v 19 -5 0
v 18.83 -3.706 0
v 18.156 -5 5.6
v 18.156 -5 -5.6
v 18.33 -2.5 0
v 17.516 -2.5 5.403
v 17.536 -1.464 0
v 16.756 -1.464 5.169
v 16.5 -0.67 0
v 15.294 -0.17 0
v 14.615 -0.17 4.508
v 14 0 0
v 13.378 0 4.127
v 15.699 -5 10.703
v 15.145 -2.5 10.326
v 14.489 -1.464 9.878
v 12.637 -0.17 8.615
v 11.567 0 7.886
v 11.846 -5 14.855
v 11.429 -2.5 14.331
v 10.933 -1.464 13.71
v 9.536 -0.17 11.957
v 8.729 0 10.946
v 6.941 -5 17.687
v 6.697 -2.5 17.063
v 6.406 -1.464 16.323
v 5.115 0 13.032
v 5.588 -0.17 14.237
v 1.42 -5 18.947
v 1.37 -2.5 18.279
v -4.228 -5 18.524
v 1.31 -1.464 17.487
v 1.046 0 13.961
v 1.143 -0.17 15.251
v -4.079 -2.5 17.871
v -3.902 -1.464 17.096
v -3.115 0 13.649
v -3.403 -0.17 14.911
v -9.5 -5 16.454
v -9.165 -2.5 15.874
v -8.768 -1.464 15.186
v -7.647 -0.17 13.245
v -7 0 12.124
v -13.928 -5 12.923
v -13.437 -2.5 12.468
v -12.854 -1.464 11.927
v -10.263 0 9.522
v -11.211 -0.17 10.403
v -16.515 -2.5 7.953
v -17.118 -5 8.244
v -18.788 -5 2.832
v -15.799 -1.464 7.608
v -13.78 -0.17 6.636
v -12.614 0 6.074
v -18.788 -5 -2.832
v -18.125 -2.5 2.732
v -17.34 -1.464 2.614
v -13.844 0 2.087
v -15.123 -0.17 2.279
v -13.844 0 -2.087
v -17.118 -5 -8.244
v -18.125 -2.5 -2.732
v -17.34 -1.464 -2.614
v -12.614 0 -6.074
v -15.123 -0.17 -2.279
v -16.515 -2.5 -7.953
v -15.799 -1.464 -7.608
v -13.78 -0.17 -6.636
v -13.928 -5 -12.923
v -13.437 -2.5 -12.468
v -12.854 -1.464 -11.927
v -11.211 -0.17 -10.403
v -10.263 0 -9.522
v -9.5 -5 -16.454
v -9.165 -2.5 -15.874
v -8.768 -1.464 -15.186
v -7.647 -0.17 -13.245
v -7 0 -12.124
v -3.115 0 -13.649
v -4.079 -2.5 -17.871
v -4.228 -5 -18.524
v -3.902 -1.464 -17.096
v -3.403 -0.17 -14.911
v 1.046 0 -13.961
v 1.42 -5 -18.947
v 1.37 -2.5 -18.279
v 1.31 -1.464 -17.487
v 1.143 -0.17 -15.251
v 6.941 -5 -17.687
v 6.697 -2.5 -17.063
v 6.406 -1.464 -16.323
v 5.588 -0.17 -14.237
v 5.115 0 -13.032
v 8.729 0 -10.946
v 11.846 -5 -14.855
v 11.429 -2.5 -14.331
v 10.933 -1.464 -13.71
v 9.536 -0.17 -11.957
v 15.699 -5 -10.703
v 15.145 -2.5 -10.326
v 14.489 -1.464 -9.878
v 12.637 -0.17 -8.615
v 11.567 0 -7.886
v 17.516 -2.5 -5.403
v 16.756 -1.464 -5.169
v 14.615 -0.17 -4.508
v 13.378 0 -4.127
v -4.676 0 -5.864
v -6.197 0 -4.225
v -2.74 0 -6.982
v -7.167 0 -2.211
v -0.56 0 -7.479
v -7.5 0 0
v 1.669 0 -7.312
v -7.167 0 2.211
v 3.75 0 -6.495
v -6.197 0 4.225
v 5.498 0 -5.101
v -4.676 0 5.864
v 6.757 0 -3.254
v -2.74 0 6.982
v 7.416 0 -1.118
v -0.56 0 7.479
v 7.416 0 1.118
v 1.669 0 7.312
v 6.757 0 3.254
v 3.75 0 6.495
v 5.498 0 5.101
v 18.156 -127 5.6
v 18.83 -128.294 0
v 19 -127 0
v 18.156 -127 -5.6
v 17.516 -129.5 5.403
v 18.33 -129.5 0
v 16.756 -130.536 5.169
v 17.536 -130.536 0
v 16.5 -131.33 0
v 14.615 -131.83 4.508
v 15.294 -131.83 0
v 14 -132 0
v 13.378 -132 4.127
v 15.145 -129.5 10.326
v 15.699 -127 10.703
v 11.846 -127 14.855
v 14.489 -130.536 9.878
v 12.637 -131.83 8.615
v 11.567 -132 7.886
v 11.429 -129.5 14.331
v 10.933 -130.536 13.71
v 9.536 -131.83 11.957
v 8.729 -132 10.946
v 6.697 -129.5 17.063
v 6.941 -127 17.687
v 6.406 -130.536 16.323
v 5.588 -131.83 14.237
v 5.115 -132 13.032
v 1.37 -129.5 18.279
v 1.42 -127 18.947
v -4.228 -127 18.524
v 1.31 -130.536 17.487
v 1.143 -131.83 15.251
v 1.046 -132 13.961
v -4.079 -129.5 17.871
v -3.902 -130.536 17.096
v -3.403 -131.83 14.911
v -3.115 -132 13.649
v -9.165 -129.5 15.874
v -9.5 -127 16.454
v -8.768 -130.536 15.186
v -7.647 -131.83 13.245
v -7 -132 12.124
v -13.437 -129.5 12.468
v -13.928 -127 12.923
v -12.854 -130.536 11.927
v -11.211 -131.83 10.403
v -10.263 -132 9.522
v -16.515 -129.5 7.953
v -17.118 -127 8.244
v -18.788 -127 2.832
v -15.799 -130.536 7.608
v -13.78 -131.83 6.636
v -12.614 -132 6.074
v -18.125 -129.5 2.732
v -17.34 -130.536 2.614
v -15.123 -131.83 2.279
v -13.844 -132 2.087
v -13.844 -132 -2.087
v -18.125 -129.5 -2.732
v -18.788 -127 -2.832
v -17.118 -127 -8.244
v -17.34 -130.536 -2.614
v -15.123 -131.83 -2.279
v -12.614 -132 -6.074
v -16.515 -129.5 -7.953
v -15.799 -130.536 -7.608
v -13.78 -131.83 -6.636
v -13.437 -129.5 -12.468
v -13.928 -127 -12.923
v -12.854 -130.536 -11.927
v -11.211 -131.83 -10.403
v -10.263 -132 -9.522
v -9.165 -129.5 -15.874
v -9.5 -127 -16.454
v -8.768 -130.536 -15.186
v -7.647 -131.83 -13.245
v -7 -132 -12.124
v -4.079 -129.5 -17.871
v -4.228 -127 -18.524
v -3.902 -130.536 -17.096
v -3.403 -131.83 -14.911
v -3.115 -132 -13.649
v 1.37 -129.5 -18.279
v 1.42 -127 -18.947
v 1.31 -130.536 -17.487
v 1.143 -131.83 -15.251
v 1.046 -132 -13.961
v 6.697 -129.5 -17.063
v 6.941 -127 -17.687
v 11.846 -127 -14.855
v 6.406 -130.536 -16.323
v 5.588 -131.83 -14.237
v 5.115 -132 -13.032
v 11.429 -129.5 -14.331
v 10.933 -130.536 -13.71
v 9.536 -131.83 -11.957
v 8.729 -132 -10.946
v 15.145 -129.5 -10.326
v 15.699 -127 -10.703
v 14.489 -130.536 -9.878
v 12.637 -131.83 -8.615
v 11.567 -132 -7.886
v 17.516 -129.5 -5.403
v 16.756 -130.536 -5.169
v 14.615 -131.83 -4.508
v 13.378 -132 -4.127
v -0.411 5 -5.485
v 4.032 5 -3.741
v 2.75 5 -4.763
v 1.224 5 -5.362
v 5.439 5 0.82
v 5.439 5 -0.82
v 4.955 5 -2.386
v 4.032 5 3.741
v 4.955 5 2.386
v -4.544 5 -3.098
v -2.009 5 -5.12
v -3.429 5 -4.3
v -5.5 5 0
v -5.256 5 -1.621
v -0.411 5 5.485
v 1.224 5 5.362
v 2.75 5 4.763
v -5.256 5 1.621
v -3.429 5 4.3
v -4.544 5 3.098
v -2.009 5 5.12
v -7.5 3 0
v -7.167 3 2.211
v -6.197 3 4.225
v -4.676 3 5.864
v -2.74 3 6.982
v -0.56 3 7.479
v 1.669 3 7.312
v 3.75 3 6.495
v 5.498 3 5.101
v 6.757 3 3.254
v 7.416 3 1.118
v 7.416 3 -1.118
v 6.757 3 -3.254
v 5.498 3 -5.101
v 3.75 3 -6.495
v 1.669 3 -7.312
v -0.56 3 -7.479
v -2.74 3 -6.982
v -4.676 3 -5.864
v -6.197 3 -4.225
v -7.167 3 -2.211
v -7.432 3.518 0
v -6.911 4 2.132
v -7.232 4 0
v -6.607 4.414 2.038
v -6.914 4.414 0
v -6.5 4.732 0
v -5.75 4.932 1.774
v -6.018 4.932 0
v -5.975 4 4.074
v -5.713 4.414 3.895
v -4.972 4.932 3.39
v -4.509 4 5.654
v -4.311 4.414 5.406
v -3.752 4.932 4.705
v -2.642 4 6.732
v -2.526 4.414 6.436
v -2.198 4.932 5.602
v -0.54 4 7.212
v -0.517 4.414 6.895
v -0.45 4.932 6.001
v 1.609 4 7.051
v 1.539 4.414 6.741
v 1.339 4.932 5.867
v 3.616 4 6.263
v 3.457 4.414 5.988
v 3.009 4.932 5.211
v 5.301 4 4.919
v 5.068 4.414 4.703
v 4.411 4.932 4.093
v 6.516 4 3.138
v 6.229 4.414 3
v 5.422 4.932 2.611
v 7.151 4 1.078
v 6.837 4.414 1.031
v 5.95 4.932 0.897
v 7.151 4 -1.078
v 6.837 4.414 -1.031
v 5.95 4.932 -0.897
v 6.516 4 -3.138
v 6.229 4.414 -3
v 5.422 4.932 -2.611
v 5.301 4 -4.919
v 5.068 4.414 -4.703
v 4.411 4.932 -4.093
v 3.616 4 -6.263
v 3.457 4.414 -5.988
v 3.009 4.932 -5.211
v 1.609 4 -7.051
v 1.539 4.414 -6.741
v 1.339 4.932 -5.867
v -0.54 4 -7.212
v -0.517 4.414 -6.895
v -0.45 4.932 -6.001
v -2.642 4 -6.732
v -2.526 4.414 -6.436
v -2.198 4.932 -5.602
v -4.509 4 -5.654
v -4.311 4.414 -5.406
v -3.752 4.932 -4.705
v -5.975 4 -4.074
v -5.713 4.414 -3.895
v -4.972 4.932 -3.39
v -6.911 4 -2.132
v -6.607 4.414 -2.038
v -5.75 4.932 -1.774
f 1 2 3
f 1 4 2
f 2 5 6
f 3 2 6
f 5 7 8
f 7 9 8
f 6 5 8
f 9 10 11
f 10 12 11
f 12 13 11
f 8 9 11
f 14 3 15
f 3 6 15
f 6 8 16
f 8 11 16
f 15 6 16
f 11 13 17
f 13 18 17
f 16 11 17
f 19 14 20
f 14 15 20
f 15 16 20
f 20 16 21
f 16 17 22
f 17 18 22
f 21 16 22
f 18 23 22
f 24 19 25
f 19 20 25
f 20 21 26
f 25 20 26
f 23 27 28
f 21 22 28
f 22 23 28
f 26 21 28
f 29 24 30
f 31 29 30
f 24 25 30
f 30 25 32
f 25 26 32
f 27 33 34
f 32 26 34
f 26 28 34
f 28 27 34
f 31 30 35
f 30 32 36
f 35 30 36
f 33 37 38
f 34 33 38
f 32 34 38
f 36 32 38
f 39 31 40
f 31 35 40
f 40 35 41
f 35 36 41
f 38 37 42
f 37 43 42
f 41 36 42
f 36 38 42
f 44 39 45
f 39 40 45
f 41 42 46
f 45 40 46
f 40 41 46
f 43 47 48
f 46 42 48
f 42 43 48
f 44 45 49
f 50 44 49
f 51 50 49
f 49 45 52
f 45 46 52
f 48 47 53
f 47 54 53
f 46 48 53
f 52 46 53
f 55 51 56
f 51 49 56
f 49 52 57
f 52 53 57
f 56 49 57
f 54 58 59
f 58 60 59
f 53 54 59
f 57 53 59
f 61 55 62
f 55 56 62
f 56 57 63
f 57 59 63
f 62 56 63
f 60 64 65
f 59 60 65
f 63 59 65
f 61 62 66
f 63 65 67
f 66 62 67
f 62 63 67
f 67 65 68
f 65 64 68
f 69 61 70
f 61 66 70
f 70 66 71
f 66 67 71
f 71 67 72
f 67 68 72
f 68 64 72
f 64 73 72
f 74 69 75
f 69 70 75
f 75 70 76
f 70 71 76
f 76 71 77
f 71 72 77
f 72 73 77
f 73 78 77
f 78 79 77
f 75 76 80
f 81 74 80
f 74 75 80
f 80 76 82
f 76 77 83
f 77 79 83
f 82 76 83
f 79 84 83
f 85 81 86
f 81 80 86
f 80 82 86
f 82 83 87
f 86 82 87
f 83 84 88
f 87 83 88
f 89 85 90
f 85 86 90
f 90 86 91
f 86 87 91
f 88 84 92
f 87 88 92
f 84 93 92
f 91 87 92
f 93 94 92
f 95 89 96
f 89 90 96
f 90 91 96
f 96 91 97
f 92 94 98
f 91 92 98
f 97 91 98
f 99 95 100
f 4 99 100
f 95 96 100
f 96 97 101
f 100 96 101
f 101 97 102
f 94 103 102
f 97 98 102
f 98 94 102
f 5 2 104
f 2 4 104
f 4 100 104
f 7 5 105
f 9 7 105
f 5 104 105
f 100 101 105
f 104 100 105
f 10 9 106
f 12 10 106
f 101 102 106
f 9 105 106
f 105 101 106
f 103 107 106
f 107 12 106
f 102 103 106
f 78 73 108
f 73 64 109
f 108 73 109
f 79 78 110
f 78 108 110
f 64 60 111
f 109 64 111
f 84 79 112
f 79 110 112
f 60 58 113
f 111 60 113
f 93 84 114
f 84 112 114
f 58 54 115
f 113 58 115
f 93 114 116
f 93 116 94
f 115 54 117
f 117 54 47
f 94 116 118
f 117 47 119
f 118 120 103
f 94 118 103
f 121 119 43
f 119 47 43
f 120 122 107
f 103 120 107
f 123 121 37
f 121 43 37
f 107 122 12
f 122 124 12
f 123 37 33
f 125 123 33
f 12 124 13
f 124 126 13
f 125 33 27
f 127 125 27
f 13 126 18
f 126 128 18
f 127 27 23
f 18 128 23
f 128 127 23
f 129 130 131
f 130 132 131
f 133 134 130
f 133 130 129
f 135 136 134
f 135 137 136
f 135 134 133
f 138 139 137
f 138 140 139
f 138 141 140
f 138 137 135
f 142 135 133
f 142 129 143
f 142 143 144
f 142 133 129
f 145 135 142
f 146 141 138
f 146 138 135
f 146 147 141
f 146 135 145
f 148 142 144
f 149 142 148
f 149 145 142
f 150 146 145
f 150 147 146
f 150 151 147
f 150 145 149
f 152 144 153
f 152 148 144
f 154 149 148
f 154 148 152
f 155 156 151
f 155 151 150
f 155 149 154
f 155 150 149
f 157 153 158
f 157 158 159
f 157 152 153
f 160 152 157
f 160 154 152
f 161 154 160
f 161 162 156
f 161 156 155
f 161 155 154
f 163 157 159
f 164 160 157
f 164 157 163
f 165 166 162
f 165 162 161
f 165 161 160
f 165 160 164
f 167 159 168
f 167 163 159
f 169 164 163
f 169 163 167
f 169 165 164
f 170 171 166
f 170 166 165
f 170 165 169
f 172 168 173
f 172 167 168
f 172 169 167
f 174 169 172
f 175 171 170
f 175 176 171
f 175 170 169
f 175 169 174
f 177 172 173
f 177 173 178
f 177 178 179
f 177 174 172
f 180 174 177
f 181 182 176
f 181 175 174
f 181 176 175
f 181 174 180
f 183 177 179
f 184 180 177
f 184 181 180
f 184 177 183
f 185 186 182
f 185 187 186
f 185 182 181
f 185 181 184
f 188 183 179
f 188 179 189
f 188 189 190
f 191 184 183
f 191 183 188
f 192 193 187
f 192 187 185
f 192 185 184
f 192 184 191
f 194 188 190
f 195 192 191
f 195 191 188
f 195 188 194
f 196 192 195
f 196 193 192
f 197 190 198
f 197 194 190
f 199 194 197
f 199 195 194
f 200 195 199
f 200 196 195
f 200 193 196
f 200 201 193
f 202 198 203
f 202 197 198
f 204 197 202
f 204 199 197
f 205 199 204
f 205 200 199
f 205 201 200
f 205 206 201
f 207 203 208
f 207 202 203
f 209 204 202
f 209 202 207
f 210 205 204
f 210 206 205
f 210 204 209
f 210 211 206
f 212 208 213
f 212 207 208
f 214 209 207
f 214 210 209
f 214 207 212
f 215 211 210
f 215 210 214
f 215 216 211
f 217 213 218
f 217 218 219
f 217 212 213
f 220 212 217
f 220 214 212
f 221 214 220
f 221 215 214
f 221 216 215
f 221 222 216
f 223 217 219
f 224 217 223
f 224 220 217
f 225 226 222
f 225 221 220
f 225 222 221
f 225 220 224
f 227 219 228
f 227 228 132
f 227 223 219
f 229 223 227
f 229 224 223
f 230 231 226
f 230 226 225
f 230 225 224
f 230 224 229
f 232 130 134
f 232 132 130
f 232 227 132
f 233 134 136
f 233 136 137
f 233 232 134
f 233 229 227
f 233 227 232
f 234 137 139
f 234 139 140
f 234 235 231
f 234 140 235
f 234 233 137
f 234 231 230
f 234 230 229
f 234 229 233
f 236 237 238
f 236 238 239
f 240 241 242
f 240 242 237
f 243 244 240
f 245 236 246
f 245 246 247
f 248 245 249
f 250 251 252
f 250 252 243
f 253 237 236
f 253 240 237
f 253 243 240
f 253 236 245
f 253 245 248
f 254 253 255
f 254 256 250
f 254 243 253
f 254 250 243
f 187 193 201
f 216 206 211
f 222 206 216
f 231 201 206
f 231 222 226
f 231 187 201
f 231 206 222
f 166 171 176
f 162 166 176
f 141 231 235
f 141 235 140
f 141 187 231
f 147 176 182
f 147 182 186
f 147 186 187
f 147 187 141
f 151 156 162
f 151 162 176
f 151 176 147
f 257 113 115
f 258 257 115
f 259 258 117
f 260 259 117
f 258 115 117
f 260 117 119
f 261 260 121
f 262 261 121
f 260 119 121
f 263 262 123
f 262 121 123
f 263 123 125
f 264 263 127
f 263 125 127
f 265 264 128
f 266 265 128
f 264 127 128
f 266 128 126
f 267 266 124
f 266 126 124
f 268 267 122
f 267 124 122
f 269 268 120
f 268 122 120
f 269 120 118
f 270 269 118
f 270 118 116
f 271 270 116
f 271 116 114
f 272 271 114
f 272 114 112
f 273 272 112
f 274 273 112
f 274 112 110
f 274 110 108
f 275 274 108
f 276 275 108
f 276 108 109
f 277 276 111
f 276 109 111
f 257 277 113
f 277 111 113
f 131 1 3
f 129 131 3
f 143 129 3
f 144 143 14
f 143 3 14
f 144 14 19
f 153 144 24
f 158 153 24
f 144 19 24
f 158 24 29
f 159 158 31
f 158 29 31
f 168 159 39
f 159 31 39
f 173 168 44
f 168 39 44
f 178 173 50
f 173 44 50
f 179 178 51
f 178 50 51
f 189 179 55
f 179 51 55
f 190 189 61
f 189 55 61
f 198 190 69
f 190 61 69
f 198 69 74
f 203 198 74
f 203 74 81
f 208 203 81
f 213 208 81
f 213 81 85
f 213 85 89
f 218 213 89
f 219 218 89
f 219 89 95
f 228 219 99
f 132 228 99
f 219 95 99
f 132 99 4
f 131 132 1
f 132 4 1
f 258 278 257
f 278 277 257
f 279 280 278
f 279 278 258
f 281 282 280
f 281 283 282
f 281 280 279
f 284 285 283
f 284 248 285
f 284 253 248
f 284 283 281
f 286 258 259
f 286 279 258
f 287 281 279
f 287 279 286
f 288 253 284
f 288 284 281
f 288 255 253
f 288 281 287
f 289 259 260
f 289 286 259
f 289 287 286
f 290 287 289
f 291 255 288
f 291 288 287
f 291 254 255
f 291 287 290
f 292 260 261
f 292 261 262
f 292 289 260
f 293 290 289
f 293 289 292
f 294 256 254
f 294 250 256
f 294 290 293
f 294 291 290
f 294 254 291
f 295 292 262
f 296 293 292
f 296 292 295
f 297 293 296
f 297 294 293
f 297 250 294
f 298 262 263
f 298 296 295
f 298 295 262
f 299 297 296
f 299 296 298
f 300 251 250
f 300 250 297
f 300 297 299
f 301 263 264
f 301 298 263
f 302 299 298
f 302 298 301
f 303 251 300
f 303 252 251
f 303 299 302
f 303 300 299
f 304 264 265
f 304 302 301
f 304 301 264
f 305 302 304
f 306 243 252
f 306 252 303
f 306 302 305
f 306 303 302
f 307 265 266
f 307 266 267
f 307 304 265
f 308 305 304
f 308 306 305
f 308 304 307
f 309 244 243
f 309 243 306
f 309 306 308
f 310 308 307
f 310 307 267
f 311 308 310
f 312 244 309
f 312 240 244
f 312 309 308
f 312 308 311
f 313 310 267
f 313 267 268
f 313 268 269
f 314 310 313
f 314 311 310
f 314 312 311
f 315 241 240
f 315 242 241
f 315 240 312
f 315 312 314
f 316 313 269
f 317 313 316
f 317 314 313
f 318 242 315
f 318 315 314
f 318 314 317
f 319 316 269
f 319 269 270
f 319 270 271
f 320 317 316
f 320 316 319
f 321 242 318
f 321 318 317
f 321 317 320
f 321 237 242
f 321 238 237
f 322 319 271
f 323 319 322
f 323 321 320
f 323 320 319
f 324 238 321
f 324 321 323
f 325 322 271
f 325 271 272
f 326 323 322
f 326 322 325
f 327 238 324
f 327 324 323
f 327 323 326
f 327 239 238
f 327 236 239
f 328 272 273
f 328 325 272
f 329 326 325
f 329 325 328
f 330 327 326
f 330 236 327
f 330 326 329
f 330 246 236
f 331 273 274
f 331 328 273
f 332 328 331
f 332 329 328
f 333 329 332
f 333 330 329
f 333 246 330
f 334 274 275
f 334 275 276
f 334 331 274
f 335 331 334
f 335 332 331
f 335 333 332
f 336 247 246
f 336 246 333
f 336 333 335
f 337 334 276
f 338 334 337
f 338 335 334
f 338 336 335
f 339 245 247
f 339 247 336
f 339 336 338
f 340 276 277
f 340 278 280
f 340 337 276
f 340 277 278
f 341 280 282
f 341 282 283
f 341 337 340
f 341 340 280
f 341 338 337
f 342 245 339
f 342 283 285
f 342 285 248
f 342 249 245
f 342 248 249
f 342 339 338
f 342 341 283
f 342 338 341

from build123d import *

# Parameters (mm, degrees)
F0_R     = 19
F1_DEPTH = 132
F2_R     = 5
F3_R     = 7.5
F4_DEPTH = 5
F5_R     = 2


with BuildPart() as f1:
    # F0 (on Front) → F1 (new body)
    with BuildSketch(Plane.XZ):
        Circle(F0_R)
    extrude(amount=F1_DEPTH)

    # F2
    f2_edges = [f1.edges().sort_by_distance(p)[0] for p in [
        (-19, -132, 0),
        (-19, 0, 0),
    ]]
    fillet(f2_edges, radius=F2_R)

    # F3 (on face) → F4 (join)
    with BuildSketch(Plane(origin=(0, 0, 0), x_dir=(-1, 0, 0), z_dir=(0, 1, 0))):
        Circle(F3_R)
    extrude(amount=F4_DEPTH)

    # F5
    f5_edges = [f1.edges().sort_by_distance(p)[0] for p in [
        (7.5, 5, 0),
    ]]
    fillet(f5_edges, radius=F5_R)


solid = f1.part
